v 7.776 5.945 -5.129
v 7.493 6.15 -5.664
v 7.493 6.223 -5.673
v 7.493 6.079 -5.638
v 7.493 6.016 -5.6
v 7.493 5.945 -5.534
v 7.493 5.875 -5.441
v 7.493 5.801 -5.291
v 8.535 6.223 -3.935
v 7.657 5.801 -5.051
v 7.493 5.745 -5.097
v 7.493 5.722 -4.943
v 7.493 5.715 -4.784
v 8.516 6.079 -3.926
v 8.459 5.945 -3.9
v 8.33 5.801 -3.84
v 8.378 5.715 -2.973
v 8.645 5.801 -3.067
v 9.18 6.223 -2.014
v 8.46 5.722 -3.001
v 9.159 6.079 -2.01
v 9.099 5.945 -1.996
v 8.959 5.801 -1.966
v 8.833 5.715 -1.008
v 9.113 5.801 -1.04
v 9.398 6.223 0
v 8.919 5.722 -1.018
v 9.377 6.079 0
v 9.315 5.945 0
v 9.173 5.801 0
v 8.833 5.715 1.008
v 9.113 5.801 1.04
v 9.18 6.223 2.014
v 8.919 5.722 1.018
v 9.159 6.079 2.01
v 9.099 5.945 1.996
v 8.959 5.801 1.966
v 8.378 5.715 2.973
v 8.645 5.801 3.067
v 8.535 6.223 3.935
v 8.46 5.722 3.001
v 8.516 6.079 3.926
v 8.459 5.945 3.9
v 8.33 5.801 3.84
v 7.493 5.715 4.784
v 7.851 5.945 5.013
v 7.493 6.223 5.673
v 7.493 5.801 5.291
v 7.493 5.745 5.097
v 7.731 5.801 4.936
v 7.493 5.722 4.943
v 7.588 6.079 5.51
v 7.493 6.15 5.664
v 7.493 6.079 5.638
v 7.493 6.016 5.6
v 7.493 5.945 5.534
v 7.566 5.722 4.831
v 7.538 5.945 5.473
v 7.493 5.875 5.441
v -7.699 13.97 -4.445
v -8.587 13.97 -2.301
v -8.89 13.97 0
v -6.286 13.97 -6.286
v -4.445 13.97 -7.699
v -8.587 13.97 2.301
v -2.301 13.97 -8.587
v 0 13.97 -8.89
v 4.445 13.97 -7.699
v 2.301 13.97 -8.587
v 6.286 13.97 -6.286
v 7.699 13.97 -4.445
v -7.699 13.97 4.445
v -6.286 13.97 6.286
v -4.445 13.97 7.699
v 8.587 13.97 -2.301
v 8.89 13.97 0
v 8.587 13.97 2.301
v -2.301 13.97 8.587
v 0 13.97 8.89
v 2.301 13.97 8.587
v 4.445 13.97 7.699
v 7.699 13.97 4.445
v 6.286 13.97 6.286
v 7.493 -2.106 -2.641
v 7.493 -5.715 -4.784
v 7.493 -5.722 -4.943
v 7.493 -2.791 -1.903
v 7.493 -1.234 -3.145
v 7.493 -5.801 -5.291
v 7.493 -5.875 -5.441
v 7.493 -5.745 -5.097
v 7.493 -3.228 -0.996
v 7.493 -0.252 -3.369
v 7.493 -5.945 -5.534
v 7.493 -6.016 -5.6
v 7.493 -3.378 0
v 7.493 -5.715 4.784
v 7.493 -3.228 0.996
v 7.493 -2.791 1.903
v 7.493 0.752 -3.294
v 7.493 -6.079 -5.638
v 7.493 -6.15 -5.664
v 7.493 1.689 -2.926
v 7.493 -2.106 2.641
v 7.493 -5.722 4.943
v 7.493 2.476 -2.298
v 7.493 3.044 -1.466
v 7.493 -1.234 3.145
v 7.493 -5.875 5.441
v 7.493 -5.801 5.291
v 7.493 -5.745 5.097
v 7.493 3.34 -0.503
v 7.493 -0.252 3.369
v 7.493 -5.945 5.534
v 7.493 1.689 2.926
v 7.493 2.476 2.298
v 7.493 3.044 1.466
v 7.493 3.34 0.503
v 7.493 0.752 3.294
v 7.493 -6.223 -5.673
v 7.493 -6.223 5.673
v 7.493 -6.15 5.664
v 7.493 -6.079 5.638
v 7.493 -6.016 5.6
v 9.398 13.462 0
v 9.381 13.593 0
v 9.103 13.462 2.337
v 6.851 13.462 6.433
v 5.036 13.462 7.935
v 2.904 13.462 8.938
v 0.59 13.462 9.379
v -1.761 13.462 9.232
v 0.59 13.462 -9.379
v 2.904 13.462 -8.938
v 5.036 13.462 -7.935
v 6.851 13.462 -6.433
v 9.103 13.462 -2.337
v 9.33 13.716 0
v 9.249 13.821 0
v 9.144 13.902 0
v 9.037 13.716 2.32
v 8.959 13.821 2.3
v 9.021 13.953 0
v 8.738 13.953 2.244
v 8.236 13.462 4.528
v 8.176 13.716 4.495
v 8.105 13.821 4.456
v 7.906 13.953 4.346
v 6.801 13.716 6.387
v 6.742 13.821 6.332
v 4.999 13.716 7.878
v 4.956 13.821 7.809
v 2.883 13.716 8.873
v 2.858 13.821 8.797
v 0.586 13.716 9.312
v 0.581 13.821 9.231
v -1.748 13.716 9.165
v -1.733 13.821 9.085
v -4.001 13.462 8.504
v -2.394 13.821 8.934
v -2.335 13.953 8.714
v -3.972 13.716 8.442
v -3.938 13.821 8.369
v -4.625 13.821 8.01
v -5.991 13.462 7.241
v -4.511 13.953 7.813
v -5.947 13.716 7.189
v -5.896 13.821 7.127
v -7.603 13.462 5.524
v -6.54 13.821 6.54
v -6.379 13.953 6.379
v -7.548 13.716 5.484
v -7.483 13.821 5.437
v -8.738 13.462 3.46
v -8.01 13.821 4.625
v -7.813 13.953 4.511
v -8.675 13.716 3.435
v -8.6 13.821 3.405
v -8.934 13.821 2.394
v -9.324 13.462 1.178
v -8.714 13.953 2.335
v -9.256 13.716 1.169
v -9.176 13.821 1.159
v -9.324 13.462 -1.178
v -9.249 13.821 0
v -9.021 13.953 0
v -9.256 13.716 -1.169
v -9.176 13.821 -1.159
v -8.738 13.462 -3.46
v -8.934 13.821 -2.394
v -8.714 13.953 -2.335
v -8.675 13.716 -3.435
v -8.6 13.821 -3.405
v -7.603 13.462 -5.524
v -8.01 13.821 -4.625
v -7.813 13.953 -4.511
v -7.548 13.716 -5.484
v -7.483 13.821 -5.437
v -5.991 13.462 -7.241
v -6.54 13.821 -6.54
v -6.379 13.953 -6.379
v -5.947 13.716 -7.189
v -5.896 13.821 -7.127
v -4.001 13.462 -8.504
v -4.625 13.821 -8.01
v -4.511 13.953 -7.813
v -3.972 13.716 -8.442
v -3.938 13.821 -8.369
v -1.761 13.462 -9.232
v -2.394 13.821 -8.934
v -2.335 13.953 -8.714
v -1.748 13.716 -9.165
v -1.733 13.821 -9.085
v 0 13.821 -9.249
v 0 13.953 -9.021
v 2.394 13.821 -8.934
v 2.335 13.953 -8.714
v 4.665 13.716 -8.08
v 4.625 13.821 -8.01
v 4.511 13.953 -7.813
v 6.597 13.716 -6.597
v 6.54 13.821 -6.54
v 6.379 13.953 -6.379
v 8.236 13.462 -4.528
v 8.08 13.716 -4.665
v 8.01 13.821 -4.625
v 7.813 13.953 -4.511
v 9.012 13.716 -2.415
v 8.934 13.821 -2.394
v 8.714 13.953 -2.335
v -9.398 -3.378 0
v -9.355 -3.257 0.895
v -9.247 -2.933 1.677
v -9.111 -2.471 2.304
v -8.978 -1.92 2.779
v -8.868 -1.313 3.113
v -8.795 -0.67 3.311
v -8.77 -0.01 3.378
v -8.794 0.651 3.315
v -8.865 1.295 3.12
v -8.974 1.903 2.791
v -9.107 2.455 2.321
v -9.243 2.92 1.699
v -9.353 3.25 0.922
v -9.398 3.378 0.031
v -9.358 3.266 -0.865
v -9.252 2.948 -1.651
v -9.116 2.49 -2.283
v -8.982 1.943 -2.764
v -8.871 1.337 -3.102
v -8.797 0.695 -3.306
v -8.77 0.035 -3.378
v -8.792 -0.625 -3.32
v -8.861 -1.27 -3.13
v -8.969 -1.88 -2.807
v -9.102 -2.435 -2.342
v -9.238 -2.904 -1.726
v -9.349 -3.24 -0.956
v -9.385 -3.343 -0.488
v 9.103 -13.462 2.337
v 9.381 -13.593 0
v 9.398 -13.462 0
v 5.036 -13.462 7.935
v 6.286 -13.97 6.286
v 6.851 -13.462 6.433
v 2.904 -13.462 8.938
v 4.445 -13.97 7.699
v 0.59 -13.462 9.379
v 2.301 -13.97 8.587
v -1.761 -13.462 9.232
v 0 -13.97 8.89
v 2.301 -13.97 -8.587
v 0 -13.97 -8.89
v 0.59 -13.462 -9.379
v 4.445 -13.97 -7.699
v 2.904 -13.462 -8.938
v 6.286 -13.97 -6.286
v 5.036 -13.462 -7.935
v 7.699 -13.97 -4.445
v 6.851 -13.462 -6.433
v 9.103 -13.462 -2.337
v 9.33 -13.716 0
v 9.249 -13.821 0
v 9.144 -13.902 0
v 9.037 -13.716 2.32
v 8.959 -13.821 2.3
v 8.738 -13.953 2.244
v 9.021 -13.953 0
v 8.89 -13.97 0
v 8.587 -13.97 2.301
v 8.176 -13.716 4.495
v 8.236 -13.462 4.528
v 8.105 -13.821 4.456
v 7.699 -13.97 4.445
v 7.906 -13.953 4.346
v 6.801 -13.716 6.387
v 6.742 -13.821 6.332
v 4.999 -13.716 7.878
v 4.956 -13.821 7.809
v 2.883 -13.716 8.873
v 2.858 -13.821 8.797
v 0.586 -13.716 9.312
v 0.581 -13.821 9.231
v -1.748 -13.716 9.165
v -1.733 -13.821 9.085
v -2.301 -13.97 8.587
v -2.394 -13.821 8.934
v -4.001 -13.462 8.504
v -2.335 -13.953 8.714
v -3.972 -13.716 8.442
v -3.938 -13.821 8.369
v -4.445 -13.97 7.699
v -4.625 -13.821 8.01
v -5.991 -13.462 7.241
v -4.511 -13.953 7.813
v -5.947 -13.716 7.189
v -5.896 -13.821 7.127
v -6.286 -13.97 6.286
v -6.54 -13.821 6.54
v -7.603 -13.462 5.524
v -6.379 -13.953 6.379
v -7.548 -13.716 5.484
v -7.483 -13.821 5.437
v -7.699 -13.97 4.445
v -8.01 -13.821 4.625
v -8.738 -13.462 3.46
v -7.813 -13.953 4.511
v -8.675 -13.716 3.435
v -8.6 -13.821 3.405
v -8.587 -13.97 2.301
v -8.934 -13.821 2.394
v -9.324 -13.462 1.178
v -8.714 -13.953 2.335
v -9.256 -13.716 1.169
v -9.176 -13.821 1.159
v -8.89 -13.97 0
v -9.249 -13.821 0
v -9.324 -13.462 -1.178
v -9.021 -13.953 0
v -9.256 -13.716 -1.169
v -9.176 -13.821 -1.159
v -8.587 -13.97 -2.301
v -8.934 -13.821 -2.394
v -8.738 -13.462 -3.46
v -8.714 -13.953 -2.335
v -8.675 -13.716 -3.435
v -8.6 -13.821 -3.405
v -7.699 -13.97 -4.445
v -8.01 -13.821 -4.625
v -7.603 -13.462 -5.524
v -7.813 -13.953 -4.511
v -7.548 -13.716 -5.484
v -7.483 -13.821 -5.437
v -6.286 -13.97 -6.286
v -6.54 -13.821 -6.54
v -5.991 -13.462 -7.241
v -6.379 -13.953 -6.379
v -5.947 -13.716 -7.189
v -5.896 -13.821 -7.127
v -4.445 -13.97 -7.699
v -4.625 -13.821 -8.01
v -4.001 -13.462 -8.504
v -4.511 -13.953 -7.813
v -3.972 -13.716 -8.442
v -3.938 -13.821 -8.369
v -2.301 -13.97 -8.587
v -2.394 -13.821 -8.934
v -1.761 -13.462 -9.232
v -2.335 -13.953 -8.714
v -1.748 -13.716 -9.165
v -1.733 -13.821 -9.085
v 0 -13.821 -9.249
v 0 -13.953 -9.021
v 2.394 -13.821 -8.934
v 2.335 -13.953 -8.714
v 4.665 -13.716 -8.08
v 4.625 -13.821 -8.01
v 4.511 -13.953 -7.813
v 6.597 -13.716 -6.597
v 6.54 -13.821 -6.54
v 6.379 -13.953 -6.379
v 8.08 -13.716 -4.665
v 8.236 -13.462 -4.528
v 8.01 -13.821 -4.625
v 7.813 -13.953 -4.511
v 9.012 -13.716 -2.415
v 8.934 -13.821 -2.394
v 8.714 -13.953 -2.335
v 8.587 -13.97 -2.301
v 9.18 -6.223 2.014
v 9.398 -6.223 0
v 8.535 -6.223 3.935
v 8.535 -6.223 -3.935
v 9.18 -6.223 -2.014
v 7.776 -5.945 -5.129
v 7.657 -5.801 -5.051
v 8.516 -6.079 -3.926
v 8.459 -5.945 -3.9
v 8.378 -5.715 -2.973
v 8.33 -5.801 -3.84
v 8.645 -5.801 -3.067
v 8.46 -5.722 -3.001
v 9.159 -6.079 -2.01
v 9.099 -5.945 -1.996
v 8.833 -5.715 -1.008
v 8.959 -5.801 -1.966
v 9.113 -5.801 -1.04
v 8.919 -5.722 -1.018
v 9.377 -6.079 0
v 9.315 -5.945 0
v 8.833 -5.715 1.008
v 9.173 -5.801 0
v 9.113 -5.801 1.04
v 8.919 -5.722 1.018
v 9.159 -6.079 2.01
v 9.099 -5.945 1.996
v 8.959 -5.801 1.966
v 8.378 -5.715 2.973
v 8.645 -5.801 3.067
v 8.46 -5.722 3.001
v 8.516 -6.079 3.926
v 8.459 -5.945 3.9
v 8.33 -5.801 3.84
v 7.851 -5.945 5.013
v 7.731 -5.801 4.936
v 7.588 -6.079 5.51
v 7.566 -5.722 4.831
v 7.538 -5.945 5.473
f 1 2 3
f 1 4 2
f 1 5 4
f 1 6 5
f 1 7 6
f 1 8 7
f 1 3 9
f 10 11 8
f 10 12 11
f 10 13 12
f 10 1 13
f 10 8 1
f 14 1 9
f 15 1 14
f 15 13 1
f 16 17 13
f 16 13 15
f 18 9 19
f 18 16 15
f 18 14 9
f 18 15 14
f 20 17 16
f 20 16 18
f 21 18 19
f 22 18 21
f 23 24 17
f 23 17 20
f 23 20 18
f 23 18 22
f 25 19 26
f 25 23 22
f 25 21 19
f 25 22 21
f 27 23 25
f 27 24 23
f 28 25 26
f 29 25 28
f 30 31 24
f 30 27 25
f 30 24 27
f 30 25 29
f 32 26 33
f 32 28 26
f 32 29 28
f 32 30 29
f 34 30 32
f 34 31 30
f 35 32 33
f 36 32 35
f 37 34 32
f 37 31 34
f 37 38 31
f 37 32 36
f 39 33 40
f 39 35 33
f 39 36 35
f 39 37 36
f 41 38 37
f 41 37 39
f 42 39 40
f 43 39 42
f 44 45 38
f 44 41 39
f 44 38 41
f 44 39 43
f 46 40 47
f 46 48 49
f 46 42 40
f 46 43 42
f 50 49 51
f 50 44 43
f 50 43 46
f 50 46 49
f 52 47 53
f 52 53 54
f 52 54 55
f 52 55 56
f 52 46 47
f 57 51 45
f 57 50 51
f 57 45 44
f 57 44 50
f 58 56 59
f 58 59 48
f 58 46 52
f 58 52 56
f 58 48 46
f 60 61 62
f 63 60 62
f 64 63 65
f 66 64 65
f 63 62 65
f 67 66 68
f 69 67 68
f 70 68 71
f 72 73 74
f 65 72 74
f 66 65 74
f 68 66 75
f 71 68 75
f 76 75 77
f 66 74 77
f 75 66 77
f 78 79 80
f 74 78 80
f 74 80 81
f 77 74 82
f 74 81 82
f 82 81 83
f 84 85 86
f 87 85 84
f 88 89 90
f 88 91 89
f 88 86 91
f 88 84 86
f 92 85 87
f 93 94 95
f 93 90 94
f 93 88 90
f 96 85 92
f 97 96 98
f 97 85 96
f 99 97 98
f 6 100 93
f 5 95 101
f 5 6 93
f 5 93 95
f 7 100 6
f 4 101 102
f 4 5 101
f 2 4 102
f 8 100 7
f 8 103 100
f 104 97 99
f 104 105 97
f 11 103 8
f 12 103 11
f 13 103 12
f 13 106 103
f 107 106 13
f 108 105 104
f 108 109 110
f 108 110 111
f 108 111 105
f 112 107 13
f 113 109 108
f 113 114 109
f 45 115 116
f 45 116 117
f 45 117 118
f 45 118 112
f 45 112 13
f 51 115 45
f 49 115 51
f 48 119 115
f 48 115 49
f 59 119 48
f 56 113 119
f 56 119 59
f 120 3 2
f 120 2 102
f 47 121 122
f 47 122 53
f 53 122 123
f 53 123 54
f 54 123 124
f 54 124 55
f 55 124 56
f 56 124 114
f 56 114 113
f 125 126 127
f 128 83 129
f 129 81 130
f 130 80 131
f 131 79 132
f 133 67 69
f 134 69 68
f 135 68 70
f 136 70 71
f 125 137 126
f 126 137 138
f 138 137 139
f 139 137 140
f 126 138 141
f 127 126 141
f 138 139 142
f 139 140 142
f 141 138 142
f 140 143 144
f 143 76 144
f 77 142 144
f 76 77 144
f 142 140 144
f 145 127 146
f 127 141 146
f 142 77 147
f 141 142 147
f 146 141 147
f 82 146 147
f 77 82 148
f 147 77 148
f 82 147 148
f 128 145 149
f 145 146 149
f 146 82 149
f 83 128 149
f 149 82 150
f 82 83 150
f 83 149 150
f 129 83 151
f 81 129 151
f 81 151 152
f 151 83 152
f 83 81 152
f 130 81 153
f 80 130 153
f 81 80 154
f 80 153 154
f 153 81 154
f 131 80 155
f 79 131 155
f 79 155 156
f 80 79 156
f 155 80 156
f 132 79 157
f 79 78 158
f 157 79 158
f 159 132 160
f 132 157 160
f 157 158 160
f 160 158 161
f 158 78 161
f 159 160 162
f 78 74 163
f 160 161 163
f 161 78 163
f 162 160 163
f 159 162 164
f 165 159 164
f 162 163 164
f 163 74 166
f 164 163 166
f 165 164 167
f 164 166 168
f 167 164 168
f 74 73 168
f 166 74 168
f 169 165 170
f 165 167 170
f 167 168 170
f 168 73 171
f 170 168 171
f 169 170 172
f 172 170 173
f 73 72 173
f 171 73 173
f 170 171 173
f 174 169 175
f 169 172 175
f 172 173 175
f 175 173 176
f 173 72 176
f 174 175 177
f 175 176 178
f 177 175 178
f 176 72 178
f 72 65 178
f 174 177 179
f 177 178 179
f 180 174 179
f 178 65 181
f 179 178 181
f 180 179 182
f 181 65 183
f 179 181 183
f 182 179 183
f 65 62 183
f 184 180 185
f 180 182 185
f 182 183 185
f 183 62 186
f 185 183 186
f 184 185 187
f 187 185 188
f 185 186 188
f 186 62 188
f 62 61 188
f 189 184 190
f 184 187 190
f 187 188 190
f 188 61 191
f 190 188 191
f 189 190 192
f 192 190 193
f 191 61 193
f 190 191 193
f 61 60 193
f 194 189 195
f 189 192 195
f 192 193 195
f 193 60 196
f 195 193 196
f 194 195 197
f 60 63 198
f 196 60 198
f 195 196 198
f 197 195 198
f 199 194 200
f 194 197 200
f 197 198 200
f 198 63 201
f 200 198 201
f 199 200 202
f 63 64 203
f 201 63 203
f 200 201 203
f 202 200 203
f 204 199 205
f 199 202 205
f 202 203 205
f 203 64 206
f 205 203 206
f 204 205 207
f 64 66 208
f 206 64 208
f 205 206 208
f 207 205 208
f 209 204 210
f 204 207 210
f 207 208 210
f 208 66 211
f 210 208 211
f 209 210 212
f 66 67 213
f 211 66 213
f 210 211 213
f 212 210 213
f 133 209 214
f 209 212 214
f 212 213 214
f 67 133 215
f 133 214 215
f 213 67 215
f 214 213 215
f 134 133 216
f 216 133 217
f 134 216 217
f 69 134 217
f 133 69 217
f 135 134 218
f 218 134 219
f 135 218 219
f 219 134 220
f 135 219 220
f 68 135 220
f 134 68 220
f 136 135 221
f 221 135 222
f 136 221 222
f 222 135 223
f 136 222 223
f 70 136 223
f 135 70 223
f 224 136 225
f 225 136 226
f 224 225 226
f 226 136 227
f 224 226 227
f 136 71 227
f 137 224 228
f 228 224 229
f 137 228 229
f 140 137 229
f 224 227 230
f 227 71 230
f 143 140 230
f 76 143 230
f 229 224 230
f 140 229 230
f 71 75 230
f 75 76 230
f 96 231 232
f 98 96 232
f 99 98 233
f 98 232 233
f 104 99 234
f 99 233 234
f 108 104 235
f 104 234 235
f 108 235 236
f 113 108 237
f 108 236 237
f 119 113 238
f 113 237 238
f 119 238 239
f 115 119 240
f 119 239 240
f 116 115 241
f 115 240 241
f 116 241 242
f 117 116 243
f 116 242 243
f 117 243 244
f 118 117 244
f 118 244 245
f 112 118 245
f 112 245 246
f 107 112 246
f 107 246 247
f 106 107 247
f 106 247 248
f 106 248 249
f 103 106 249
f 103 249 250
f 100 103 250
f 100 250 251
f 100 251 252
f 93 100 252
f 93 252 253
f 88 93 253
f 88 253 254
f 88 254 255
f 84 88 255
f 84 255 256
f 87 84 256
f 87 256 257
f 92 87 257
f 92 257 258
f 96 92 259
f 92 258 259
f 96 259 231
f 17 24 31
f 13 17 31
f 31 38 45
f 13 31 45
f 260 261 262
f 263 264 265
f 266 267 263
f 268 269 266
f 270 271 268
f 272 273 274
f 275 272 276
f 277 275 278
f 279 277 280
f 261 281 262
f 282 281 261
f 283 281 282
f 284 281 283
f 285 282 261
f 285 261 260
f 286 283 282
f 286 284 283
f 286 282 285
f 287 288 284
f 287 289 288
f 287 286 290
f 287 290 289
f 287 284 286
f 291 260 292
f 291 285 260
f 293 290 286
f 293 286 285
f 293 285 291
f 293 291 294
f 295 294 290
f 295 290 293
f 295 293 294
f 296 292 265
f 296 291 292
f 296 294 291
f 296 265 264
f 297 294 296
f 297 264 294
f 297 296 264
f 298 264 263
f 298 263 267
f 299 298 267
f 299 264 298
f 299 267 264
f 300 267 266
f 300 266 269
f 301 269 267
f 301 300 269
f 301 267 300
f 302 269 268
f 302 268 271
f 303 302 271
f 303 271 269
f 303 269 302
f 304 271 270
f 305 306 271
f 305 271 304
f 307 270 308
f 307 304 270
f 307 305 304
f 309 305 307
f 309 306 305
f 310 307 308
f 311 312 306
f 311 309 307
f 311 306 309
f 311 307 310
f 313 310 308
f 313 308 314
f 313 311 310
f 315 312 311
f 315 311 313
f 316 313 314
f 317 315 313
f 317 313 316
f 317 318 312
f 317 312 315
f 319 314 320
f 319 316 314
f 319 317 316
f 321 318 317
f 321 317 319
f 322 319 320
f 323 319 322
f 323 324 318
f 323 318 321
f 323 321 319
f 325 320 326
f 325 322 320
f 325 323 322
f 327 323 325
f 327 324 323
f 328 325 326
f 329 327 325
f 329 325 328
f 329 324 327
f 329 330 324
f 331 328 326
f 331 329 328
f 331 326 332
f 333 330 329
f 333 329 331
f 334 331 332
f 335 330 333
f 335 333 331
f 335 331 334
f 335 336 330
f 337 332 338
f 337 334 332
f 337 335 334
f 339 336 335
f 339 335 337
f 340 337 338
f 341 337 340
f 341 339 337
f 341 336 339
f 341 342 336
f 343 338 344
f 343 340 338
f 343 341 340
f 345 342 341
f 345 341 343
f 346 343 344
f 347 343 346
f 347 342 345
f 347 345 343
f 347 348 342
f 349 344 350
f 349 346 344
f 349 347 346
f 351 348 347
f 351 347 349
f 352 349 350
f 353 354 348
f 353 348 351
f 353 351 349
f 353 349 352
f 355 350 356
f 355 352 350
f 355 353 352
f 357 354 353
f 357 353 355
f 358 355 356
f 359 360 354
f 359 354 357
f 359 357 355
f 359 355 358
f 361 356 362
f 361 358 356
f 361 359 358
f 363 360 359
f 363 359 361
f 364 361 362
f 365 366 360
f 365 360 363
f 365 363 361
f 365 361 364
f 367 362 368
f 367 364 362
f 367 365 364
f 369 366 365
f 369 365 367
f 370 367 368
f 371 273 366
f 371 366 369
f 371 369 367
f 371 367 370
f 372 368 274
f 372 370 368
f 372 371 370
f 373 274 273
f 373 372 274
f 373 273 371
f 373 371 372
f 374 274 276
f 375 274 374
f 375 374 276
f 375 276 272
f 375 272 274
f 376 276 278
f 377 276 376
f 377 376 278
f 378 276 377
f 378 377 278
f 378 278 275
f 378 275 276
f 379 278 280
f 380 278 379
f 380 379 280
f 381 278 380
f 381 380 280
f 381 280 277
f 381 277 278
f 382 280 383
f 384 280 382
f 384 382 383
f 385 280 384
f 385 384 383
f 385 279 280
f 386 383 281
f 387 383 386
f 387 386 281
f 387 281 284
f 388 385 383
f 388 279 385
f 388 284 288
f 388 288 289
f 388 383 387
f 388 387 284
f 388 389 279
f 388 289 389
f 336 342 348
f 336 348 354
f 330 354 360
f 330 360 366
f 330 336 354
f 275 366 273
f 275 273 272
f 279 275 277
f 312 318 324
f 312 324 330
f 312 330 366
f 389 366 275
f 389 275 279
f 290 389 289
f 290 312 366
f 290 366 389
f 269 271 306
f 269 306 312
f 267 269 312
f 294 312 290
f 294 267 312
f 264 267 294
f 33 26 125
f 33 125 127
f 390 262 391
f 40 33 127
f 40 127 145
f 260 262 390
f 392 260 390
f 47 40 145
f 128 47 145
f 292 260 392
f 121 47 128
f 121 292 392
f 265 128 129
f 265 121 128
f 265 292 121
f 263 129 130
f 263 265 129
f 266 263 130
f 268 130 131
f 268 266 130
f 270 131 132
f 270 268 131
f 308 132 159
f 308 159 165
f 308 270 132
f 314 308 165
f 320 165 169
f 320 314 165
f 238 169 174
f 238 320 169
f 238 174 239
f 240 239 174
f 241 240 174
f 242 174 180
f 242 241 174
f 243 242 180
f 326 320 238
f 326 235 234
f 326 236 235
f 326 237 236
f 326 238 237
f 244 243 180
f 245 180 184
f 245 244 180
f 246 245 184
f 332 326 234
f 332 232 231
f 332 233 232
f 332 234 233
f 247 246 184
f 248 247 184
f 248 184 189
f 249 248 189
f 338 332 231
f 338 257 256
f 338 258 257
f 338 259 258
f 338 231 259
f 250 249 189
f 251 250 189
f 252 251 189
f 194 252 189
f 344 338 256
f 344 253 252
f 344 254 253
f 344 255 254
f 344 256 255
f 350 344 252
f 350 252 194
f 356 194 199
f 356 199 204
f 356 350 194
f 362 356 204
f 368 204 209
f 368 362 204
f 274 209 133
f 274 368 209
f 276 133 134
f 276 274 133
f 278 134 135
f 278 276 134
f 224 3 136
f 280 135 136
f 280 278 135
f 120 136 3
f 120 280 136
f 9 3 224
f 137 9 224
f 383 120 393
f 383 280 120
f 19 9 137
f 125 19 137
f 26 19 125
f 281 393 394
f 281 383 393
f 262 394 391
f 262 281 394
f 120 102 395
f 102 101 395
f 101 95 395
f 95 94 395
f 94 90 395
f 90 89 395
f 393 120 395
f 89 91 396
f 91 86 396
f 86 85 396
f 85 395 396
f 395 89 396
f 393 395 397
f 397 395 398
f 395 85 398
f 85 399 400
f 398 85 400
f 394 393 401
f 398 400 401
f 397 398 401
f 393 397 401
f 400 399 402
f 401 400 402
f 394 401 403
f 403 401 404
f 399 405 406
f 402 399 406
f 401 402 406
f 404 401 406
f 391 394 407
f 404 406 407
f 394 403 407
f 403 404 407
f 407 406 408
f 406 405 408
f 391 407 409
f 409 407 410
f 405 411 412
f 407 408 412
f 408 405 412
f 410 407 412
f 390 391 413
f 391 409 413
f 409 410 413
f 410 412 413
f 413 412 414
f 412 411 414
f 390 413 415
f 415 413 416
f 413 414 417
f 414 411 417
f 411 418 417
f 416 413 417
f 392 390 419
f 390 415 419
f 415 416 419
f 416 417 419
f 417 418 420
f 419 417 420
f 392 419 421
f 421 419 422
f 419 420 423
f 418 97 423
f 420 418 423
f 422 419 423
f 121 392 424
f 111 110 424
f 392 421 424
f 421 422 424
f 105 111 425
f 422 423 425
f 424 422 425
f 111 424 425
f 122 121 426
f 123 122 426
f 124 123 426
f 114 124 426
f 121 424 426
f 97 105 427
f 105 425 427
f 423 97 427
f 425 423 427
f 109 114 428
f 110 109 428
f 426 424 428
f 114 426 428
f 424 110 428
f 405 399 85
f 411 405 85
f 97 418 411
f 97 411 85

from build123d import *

# Parameters (mm, degrees)
F0_R          = 9.398
F1_DEPTH      = 13.97
F1_DEPTH_BACK = 13.97
F4_D          = 6.7564
F5_W          = 11.43
F5_H          = 25.3408506978
F6_DEPTH      = 2.54
F7_R          = 0.508


with BuildPart() as f1:
    # F0 (on Front) → F1 (new body, two sides)
    with BuildSketch(Plane.XZ) as f1_sk:
        Circle(F0_R)
    extrude(amount=F1_DEPTH)
    extrude(f1_sk.sketch, amount=-F1_DEPTH_BACK)

    # F4 (through all)
    with Locations(Plane.YZ.offset(10.033)):
        with Locations((0, 0)):
            Hole(F4_D / 2)

    # F5 (on offset) → F6 (cut)
    with BuildSketch(Plane.YZ.offset(10.033)):
        Rectangle(F5_W, F5_H)
    extrude(amount=-F6_DEPTH, mode=Mode.SUBTRACT)

    # F7
    f7_edges = [f1.edges().sort_by_distance(p)[0] for p in [
        (-9.398, 13.97, 0),
        (-9.398, -13.97, 0),
        (8.90903, 5.715, 2.991922),
        (8.90903, 5.715, -2.991922),
        (8.90903, -5.715, 2.991922),
        (8.90903, -5.715, -2.991922),
    ]]
    fillet(f7_edges, radius=F7_R)


solid = f1.part
